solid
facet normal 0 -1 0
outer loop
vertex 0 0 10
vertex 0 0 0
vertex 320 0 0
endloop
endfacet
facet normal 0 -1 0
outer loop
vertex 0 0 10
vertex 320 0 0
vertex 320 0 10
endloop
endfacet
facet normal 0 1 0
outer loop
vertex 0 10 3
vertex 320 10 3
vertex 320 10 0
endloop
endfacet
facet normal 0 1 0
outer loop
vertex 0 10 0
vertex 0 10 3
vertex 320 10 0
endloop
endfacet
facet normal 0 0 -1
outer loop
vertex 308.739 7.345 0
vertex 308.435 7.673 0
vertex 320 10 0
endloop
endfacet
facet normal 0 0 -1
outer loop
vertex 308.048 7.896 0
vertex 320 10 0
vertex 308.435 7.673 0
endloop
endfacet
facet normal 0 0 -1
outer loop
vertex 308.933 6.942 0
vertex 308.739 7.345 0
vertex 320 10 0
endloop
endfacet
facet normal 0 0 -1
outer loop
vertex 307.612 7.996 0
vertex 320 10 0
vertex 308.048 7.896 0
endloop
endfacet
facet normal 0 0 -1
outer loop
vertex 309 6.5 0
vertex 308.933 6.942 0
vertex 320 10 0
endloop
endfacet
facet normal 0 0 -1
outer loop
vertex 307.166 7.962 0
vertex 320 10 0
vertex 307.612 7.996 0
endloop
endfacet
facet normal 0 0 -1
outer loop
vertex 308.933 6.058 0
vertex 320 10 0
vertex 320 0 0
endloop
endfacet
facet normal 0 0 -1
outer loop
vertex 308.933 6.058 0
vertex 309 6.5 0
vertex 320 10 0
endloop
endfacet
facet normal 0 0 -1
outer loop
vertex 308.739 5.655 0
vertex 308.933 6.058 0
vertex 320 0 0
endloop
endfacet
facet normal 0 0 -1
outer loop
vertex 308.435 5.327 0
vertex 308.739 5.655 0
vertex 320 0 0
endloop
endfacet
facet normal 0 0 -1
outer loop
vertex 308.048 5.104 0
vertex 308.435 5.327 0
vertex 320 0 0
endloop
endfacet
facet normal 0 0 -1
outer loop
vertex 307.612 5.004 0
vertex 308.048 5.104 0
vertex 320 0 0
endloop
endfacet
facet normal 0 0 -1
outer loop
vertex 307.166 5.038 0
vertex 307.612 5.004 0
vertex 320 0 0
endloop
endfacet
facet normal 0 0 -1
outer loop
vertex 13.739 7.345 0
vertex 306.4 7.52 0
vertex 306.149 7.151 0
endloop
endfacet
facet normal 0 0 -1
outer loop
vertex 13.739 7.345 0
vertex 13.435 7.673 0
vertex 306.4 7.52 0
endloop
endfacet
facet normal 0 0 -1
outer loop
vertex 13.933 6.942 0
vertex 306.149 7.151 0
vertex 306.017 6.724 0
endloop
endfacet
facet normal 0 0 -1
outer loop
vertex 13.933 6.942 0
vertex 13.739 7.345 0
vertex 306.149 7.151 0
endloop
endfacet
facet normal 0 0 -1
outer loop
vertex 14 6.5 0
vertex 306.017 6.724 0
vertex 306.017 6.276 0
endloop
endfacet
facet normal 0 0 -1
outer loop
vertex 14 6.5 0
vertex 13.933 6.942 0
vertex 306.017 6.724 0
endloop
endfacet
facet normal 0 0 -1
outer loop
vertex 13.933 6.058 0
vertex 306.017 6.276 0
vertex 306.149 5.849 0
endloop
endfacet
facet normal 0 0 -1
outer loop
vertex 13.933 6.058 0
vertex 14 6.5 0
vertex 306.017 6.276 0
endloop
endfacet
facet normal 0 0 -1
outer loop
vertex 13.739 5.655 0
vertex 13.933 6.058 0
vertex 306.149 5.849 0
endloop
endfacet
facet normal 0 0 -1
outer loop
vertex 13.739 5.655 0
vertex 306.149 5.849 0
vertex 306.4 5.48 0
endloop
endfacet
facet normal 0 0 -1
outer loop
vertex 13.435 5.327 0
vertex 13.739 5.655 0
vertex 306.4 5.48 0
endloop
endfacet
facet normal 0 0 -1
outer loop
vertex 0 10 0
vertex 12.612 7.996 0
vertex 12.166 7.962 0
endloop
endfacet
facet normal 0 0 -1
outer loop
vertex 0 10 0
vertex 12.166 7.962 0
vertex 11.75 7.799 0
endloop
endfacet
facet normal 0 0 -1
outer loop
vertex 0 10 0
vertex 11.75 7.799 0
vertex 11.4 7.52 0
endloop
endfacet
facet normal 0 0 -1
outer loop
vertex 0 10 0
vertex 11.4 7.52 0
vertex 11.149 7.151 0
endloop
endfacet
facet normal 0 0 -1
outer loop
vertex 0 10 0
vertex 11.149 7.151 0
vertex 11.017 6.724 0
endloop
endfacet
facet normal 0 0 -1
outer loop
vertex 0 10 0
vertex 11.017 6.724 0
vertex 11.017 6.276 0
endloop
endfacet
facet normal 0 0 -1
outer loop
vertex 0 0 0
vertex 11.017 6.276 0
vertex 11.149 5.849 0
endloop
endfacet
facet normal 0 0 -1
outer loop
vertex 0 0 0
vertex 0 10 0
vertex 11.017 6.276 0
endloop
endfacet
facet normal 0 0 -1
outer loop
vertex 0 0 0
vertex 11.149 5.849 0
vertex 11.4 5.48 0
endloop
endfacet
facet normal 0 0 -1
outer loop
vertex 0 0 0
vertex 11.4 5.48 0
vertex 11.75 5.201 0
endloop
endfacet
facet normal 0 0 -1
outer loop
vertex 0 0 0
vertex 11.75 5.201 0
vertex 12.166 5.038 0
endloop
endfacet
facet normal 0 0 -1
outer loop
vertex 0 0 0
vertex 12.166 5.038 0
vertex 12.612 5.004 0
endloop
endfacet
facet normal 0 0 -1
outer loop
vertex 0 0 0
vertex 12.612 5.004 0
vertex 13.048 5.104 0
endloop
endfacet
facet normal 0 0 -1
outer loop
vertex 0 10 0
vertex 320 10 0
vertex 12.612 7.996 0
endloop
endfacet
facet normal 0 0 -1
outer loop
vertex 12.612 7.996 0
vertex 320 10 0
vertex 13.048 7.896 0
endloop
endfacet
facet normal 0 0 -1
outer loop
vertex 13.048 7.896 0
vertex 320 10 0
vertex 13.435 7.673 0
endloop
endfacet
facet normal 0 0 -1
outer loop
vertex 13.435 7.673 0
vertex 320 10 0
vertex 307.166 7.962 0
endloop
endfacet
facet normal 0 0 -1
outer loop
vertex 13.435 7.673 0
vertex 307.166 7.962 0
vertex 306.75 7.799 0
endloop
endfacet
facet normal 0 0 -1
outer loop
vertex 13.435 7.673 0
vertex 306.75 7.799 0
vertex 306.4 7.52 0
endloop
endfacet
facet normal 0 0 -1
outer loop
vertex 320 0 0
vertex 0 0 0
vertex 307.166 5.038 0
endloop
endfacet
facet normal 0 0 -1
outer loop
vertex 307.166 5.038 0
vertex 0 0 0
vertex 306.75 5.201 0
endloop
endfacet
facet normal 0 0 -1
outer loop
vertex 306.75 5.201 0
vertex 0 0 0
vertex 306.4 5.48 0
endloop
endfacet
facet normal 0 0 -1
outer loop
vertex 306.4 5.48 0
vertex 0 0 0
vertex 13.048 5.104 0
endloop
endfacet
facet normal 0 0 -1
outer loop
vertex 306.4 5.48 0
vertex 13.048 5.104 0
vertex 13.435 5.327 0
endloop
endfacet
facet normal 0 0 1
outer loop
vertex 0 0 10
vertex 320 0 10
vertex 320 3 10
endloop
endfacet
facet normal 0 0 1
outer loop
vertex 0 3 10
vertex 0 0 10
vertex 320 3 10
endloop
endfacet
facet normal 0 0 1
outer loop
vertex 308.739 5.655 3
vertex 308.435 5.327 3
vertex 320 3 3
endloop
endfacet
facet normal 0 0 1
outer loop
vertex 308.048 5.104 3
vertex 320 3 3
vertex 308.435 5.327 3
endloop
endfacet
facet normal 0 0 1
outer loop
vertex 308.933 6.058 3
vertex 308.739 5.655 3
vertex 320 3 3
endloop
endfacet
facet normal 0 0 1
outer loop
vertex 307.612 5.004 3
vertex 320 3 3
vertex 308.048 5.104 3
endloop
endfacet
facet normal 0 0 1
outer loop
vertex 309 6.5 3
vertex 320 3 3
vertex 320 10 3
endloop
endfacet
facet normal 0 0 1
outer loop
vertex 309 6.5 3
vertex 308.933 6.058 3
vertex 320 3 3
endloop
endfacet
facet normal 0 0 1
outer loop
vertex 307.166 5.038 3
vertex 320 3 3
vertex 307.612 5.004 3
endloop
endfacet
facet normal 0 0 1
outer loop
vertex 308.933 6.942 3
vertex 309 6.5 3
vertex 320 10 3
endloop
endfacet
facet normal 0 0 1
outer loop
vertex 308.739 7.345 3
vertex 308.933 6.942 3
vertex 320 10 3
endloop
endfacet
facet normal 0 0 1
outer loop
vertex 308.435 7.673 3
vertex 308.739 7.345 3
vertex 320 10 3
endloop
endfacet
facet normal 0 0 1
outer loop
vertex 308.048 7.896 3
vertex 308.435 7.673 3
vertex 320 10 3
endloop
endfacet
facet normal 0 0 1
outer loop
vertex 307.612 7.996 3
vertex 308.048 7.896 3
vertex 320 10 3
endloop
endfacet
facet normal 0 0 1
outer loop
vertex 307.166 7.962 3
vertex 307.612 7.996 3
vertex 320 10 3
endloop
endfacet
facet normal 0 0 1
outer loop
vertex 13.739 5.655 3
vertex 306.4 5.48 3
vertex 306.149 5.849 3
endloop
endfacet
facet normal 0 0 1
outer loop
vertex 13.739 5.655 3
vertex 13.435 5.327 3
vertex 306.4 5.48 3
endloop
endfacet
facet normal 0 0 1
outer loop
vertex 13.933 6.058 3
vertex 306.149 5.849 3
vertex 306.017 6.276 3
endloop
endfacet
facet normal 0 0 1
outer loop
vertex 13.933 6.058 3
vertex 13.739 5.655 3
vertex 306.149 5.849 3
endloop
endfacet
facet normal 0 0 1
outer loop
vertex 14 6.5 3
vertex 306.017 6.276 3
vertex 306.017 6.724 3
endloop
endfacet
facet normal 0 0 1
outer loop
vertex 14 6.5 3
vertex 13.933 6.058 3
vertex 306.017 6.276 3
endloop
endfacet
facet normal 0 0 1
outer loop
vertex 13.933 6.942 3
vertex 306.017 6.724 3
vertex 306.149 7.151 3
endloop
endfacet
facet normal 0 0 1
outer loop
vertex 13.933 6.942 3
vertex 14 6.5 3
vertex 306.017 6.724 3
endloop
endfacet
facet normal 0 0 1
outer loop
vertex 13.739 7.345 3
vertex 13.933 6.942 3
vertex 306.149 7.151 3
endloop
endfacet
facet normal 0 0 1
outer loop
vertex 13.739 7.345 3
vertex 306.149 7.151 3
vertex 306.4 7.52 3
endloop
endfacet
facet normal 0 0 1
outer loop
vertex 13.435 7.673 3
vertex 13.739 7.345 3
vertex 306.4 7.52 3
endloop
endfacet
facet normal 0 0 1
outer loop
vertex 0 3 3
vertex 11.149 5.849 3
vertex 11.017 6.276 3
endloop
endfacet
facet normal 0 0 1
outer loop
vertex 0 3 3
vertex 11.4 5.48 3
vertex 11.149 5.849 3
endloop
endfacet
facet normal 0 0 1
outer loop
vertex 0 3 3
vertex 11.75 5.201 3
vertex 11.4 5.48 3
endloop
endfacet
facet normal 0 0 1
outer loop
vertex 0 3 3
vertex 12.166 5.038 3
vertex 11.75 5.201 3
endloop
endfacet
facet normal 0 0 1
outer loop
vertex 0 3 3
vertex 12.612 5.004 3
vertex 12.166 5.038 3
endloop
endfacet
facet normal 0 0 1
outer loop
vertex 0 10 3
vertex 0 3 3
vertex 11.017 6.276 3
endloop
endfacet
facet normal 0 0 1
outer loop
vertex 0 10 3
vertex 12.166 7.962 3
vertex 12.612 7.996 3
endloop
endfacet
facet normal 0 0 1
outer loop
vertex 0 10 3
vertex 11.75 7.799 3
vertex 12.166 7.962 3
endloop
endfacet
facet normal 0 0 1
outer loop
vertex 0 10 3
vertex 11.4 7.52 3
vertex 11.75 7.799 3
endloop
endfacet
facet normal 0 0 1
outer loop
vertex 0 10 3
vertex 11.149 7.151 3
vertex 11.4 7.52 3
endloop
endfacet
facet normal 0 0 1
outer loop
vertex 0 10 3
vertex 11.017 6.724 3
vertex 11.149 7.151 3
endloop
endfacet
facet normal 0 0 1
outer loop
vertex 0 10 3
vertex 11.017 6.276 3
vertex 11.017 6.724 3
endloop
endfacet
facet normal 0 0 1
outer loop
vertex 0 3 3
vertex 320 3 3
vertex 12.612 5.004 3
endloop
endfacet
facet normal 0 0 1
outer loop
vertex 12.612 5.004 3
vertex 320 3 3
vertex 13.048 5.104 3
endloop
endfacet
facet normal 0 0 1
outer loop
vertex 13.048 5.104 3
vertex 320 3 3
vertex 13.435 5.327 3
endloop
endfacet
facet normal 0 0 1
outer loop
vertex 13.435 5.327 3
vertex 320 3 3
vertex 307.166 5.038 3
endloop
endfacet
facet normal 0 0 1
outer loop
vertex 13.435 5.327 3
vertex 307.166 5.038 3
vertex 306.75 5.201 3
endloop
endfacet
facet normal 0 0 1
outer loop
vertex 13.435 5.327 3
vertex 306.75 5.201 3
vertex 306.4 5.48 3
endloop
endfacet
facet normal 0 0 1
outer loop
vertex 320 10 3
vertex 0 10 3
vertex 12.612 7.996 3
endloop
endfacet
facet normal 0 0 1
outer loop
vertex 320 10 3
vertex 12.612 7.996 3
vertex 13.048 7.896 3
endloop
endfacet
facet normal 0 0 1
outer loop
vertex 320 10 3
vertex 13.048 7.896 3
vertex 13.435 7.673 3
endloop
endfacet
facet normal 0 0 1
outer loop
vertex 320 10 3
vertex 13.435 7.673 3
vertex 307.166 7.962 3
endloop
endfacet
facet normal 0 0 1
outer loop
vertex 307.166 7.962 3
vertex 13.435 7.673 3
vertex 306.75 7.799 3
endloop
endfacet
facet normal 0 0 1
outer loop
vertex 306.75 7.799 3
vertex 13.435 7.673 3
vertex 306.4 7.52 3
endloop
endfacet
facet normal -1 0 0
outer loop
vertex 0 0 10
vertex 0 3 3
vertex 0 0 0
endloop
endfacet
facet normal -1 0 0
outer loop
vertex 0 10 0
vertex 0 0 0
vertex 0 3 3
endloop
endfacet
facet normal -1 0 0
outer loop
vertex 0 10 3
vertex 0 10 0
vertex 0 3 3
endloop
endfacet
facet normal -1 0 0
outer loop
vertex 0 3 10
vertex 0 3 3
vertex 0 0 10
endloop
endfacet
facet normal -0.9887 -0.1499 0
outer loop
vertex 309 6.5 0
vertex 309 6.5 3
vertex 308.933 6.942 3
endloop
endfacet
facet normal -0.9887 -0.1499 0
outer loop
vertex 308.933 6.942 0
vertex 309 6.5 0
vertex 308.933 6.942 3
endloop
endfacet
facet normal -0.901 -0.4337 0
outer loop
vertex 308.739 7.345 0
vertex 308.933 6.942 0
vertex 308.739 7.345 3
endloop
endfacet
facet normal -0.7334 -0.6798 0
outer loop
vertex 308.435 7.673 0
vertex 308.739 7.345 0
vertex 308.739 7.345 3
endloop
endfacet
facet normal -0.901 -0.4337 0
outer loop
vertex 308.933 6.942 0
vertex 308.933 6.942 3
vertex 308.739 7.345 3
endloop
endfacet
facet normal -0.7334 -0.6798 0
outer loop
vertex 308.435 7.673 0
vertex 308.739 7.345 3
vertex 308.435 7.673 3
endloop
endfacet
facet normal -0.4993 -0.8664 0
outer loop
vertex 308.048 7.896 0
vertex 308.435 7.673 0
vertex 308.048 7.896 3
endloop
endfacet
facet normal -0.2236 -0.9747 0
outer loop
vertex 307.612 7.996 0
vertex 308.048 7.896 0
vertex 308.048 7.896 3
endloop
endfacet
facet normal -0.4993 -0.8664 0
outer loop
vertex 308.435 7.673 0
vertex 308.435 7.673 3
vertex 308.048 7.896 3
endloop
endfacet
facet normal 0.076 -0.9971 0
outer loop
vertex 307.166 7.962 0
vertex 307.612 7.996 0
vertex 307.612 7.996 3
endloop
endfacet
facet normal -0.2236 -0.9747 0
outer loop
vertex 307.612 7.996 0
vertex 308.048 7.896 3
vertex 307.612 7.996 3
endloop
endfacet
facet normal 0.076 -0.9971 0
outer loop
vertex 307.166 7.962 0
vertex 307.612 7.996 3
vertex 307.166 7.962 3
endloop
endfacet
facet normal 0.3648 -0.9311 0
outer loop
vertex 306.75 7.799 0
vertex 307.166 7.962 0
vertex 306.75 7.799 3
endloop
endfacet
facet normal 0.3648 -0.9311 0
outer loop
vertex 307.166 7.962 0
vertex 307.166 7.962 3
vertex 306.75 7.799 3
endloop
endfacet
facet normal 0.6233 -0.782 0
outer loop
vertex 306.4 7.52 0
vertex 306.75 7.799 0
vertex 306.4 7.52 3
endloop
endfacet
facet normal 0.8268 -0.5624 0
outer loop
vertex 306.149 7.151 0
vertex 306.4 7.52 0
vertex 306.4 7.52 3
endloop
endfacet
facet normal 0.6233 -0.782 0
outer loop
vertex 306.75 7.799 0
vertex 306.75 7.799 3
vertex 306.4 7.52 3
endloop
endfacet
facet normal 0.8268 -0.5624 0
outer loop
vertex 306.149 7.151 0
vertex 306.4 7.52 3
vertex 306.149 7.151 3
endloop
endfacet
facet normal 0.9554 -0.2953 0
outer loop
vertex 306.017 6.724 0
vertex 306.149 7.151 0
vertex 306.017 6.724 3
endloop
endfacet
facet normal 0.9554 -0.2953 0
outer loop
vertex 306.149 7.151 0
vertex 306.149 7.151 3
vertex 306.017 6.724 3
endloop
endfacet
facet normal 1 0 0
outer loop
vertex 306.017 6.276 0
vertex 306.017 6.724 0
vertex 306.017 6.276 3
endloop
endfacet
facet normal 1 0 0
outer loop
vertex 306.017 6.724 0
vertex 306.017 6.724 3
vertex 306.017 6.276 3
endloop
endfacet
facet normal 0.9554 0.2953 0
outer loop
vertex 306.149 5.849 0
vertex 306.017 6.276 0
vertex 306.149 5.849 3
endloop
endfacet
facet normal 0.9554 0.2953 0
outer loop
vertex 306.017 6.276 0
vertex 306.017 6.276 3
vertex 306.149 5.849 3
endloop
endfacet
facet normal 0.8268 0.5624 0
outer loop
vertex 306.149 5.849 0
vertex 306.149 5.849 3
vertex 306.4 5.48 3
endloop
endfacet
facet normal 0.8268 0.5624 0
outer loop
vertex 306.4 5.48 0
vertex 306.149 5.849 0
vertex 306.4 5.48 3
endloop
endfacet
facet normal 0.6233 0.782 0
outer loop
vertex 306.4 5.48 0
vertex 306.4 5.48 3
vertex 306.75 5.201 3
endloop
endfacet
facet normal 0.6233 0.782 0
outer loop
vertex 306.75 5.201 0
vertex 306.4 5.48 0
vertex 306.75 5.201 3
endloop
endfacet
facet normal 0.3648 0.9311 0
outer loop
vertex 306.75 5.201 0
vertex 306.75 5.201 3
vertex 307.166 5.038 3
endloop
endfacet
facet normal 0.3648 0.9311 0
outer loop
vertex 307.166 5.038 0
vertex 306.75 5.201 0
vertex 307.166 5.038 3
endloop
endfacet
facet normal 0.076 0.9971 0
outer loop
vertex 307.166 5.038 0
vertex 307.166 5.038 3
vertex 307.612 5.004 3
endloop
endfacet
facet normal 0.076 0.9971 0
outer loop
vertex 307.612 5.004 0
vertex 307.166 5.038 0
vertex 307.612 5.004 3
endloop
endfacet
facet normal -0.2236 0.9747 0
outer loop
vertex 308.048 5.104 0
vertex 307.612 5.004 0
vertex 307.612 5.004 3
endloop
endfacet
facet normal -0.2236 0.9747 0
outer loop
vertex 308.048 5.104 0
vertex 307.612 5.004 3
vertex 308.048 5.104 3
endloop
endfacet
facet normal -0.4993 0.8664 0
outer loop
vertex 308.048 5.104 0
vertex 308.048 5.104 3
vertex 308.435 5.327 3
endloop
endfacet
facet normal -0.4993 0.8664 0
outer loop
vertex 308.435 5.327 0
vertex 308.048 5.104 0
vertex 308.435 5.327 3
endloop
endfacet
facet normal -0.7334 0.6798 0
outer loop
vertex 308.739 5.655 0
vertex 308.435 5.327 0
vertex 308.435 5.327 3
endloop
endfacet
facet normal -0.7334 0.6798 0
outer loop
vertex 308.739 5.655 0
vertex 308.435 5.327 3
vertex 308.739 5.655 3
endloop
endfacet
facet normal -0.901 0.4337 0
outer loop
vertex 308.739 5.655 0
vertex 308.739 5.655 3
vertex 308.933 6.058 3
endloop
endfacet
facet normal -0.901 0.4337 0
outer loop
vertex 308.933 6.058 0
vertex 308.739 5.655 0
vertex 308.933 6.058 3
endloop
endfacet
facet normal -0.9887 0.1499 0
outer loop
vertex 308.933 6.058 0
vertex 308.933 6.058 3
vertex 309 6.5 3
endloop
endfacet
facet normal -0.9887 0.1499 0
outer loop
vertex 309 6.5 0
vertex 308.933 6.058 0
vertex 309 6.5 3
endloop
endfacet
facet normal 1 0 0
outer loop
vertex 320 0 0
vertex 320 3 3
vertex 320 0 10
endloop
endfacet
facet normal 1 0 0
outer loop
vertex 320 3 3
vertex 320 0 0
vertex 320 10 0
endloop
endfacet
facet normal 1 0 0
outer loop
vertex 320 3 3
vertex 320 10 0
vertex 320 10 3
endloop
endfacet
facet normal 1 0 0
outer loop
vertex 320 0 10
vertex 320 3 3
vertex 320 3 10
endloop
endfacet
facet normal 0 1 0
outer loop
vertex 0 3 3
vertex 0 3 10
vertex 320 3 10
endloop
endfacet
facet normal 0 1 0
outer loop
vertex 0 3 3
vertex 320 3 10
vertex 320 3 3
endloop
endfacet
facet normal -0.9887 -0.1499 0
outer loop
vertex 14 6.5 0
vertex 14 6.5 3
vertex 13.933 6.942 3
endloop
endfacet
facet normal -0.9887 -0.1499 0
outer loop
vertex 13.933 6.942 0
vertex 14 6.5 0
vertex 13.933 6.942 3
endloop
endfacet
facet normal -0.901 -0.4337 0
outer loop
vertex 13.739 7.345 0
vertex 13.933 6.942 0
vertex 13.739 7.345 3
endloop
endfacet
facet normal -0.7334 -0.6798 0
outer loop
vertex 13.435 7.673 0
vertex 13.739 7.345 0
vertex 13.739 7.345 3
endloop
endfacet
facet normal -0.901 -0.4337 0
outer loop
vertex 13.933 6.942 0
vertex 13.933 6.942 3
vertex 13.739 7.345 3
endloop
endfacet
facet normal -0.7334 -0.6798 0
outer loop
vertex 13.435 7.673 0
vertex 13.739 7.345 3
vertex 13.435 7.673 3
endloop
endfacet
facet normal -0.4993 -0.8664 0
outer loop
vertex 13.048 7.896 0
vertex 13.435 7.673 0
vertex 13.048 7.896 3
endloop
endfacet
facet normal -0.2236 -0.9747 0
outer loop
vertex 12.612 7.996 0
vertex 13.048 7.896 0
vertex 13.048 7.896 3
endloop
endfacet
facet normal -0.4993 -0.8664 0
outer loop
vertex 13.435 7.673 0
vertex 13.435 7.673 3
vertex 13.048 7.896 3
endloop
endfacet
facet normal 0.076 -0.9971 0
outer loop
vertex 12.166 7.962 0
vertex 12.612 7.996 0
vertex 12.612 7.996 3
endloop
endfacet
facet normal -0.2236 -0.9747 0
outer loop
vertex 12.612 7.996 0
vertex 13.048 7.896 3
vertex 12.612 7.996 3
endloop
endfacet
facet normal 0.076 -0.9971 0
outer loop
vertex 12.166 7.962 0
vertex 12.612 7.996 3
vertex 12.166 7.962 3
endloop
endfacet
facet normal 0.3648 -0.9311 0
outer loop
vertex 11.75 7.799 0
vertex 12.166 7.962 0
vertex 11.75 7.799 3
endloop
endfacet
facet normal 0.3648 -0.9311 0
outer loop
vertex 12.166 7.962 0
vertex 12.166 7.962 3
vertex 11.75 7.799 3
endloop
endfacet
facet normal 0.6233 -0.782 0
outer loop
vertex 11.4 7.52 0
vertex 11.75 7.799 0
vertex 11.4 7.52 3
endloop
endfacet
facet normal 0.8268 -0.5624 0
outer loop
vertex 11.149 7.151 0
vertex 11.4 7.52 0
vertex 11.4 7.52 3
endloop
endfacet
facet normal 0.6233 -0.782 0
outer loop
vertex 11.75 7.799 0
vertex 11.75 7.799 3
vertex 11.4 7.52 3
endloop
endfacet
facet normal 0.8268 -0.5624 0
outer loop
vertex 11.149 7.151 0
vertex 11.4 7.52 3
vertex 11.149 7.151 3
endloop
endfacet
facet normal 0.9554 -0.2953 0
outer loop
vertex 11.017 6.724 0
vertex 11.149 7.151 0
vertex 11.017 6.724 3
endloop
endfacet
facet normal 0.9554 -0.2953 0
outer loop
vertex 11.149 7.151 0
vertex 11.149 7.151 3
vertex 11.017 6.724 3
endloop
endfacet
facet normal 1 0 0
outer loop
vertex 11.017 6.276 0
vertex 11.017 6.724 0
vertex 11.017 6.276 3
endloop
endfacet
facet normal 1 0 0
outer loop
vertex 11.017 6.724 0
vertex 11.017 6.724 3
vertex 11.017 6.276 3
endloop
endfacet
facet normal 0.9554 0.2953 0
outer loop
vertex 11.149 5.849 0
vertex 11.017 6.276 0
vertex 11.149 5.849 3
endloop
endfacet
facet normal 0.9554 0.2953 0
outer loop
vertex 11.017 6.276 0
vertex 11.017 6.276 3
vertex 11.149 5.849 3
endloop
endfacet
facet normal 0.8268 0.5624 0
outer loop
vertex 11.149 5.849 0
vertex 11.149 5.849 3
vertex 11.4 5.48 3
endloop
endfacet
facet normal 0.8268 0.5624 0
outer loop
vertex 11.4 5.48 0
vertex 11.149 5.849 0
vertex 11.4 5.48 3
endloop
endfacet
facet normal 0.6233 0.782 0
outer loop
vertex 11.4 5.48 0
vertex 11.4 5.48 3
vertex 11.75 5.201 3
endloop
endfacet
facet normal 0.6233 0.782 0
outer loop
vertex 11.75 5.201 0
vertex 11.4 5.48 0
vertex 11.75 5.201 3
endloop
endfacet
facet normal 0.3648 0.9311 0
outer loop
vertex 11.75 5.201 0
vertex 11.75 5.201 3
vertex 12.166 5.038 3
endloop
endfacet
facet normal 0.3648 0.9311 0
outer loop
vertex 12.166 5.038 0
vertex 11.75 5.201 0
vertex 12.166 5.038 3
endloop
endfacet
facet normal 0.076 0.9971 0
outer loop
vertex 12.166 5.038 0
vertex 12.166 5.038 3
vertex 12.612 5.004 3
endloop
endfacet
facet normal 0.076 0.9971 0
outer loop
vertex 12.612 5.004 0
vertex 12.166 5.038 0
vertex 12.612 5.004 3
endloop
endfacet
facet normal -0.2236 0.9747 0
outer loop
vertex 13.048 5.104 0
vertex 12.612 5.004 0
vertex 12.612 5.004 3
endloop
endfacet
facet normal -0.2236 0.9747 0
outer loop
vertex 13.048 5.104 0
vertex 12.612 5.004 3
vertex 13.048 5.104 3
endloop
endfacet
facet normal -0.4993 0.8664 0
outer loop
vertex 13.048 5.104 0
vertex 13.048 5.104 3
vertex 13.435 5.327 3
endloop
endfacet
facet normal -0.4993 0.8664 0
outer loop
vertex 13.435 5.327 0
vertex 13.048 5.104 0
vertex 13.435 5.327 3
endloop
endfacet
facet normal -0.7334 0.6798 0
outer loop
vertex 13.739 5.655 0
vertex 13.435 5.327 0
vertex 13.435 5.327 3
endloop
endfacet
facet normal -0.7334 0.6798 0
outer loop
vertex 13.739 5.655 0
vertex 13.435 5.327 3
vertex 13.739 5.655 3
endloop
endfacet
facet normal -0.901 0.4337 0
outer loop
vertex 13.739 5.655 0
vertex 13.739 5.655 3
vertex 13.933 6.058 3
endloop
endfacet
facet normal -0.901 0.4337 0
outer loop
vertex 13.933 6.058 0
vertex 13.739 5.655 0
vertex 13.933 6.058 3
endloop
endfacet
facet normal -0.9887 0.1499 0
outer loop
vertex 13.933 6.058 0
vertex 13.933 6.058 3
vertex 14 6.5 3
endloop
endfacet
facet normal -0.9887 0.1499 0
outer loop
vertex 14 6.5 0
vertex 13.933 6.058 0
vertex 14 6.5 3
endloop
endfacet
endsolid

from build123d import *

# Parameters (mm, degrees)
EXTRUDE_1_DEPTH     = 320
SKETCH_2_R          = 1.5
CUT_EXTRUDE_1_DEPTH = 4


with BuildPart() as part:
    # Эскиз1 → Бобышка-Вытянуть1 (new body)
    with BuildSketch(Plane(origin=(0, 0, 0), x_dir=(0, 0, -1), z_dir=(1, 0, 0))):
        Polygon((0, 0), (-10, 0), (-10, 3), (-3, 3), (-3, 10), (0, 10), align=None)
    extrude(amount=EXTRUDE_1_DEPTH)

    # Эскиз2 → Вырез-Вытянуть1 (cut, through all)
    with BuildSketch(Plane.XY.offset(3)):
        with Locations((12.5, 6.5)):
            Circle(SKETCH_2_R)
        with Locations((307.5, 6.5)):
            Circle(SKETCH_2_R)
    extrude(amount=-CUT_EXTRUDE_1_DEPTH, mode=Mode.SUBTRACT)


solid = part.part
